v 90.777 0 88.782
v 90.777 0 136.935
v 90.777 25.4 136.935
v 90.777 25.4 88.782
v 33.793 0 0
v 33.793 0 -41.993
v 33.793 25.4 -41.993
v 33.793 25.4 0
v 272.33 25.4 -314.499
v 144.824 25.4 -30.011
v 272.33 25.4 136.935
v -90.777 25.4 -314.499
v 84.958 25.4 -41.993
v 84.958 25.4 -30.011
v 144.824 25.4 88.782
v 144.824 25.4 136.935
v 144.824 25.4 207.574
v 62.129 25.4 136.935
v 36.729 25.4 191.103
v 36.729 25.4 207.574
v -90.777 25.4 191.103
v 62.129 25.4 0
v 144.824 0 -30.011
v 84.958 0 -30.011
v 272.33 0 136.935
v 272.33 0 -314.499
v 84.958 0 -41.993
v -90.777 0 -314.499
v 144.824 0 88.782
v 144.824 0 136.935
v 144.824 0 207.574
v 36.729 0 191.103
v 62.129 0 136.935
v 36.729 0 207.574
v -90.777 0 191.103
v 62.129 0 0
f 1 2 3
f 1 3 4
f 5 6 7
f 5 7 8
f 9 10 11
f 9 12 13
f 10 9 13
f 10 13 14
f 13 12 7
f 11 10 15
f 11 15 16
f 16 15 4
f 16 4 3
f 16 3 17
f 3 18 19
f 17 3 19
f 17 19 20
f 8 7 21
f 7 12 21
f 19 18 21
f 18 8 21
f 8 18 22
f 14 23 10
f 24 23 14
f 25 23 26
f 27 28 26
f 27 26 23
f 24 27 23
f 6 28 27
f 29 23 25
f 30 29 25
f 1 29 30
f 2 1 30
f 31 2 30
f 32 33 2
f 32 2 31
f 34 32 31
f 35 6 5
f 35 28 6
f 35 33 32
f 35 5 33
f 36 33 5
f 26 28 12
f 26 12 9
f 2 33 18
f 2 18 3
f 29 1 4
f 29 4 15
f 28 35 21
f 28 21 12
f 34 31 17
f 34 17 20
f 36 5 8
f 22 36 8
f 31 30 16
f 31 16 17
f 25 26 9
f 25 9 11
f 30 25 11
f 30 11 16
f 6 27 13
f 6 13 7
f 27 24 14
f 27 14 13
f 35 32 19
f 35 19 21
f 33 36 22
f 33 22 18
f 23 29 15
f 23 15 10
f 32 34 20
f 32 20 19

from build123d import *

# Parameters (mm, degrees)
F0_W     = 181.5531998873
F0_H     = 102.3213416338
F0_W_2   = 127.5060996413
F0_H_2   = 48.1534004211
F0_H_3   = 54.1679412127
F0_W_3   = 54.047100246
F1_DEPTH = 25.4
F2_DEPTH = 25.4


with BuildPart() as f1:
    # F0 (on Front) → F1 (new body)
    with BuildSketch(Plane.XZ):
        with Locations((0, -139.9423852563)):
            Rectangle(F0_W, F0_H)
        Polygon((90.7765999436, -191.1030560732), (-90.7765999436, -191.1030560732), (-90.7765999436, -314.4985437393), (272.3297998309, -314.4985437393), (272.3297998309, -88.7817144394), (90.7765999436, -88.7817144394), align=None)
        Polygon((-90.7765999436, 88.7817144394), (-90.7765999436, -88.7817144394), (90.7765999436, -88.7817144394), (90.7765999436, -30.0107300282), (84.9582105875, -30.0107300282), (84.9582105875, -41.9930517673), (33.7925106287, -41.9930517673), (33.7925106287, 0), (36.7294996977, 0), (36.7294996977, 88.7817144394), align=None)
        Polygon((90.7765999436, -30.0107300282), (90.7765999436, -88.7817144394), (272.3297998309, -88.7817144394), (272.3297998309, 88.7817144394), (144.8237001896, 88.7817144394), (144.8237001896, 0), (144.8237001896, -30.0107300282), align=None)
        with Locations((-27.023550123, 112.85841465)):
            Rectangle(F0_W_2, F0_H_2)
        with Locations((-27.023550123, 164.0190854669)):
            Rectangle(F0_W_2, F0_H_3)
        with Locations((208.5767500103, 112.85841465)):
            Rectangle(F0_W_2, F0_H_2)
        with Locations((63.7530498207, 164.0190854669)):
            Rectangle(F0_W_3, F0_H_3)
        Polygon((90.7765999436, 118.6627522111), (90.7765999436, 88.7817144394), (144.8237001896, 88.7817144394), (144.8237001896, 136.9351148605), (90.7765999436, 136.9351148605), align=None)
        Polygon((36.7294996977, 207.5741589069), (36.7294996977, 191.1030560732), (90.7765999436, 191.1030560732), (90.7765999436, 136.9351148605), (144.8237001896, 136.9351148605), (144.8237001896, 207.5741589069), align=None)
    extrude(amount=-F1_DEPTH)

    # F2 (add): a face of the model
    f2_faces = [f1.faces().sort_by_distance(p)[0] for p in [
        (36.7294996977, 12.7, 68.4675574303),
    ]]
    extrude(f2_faces, amount=F2_DEPTH)


solid = f1.part
